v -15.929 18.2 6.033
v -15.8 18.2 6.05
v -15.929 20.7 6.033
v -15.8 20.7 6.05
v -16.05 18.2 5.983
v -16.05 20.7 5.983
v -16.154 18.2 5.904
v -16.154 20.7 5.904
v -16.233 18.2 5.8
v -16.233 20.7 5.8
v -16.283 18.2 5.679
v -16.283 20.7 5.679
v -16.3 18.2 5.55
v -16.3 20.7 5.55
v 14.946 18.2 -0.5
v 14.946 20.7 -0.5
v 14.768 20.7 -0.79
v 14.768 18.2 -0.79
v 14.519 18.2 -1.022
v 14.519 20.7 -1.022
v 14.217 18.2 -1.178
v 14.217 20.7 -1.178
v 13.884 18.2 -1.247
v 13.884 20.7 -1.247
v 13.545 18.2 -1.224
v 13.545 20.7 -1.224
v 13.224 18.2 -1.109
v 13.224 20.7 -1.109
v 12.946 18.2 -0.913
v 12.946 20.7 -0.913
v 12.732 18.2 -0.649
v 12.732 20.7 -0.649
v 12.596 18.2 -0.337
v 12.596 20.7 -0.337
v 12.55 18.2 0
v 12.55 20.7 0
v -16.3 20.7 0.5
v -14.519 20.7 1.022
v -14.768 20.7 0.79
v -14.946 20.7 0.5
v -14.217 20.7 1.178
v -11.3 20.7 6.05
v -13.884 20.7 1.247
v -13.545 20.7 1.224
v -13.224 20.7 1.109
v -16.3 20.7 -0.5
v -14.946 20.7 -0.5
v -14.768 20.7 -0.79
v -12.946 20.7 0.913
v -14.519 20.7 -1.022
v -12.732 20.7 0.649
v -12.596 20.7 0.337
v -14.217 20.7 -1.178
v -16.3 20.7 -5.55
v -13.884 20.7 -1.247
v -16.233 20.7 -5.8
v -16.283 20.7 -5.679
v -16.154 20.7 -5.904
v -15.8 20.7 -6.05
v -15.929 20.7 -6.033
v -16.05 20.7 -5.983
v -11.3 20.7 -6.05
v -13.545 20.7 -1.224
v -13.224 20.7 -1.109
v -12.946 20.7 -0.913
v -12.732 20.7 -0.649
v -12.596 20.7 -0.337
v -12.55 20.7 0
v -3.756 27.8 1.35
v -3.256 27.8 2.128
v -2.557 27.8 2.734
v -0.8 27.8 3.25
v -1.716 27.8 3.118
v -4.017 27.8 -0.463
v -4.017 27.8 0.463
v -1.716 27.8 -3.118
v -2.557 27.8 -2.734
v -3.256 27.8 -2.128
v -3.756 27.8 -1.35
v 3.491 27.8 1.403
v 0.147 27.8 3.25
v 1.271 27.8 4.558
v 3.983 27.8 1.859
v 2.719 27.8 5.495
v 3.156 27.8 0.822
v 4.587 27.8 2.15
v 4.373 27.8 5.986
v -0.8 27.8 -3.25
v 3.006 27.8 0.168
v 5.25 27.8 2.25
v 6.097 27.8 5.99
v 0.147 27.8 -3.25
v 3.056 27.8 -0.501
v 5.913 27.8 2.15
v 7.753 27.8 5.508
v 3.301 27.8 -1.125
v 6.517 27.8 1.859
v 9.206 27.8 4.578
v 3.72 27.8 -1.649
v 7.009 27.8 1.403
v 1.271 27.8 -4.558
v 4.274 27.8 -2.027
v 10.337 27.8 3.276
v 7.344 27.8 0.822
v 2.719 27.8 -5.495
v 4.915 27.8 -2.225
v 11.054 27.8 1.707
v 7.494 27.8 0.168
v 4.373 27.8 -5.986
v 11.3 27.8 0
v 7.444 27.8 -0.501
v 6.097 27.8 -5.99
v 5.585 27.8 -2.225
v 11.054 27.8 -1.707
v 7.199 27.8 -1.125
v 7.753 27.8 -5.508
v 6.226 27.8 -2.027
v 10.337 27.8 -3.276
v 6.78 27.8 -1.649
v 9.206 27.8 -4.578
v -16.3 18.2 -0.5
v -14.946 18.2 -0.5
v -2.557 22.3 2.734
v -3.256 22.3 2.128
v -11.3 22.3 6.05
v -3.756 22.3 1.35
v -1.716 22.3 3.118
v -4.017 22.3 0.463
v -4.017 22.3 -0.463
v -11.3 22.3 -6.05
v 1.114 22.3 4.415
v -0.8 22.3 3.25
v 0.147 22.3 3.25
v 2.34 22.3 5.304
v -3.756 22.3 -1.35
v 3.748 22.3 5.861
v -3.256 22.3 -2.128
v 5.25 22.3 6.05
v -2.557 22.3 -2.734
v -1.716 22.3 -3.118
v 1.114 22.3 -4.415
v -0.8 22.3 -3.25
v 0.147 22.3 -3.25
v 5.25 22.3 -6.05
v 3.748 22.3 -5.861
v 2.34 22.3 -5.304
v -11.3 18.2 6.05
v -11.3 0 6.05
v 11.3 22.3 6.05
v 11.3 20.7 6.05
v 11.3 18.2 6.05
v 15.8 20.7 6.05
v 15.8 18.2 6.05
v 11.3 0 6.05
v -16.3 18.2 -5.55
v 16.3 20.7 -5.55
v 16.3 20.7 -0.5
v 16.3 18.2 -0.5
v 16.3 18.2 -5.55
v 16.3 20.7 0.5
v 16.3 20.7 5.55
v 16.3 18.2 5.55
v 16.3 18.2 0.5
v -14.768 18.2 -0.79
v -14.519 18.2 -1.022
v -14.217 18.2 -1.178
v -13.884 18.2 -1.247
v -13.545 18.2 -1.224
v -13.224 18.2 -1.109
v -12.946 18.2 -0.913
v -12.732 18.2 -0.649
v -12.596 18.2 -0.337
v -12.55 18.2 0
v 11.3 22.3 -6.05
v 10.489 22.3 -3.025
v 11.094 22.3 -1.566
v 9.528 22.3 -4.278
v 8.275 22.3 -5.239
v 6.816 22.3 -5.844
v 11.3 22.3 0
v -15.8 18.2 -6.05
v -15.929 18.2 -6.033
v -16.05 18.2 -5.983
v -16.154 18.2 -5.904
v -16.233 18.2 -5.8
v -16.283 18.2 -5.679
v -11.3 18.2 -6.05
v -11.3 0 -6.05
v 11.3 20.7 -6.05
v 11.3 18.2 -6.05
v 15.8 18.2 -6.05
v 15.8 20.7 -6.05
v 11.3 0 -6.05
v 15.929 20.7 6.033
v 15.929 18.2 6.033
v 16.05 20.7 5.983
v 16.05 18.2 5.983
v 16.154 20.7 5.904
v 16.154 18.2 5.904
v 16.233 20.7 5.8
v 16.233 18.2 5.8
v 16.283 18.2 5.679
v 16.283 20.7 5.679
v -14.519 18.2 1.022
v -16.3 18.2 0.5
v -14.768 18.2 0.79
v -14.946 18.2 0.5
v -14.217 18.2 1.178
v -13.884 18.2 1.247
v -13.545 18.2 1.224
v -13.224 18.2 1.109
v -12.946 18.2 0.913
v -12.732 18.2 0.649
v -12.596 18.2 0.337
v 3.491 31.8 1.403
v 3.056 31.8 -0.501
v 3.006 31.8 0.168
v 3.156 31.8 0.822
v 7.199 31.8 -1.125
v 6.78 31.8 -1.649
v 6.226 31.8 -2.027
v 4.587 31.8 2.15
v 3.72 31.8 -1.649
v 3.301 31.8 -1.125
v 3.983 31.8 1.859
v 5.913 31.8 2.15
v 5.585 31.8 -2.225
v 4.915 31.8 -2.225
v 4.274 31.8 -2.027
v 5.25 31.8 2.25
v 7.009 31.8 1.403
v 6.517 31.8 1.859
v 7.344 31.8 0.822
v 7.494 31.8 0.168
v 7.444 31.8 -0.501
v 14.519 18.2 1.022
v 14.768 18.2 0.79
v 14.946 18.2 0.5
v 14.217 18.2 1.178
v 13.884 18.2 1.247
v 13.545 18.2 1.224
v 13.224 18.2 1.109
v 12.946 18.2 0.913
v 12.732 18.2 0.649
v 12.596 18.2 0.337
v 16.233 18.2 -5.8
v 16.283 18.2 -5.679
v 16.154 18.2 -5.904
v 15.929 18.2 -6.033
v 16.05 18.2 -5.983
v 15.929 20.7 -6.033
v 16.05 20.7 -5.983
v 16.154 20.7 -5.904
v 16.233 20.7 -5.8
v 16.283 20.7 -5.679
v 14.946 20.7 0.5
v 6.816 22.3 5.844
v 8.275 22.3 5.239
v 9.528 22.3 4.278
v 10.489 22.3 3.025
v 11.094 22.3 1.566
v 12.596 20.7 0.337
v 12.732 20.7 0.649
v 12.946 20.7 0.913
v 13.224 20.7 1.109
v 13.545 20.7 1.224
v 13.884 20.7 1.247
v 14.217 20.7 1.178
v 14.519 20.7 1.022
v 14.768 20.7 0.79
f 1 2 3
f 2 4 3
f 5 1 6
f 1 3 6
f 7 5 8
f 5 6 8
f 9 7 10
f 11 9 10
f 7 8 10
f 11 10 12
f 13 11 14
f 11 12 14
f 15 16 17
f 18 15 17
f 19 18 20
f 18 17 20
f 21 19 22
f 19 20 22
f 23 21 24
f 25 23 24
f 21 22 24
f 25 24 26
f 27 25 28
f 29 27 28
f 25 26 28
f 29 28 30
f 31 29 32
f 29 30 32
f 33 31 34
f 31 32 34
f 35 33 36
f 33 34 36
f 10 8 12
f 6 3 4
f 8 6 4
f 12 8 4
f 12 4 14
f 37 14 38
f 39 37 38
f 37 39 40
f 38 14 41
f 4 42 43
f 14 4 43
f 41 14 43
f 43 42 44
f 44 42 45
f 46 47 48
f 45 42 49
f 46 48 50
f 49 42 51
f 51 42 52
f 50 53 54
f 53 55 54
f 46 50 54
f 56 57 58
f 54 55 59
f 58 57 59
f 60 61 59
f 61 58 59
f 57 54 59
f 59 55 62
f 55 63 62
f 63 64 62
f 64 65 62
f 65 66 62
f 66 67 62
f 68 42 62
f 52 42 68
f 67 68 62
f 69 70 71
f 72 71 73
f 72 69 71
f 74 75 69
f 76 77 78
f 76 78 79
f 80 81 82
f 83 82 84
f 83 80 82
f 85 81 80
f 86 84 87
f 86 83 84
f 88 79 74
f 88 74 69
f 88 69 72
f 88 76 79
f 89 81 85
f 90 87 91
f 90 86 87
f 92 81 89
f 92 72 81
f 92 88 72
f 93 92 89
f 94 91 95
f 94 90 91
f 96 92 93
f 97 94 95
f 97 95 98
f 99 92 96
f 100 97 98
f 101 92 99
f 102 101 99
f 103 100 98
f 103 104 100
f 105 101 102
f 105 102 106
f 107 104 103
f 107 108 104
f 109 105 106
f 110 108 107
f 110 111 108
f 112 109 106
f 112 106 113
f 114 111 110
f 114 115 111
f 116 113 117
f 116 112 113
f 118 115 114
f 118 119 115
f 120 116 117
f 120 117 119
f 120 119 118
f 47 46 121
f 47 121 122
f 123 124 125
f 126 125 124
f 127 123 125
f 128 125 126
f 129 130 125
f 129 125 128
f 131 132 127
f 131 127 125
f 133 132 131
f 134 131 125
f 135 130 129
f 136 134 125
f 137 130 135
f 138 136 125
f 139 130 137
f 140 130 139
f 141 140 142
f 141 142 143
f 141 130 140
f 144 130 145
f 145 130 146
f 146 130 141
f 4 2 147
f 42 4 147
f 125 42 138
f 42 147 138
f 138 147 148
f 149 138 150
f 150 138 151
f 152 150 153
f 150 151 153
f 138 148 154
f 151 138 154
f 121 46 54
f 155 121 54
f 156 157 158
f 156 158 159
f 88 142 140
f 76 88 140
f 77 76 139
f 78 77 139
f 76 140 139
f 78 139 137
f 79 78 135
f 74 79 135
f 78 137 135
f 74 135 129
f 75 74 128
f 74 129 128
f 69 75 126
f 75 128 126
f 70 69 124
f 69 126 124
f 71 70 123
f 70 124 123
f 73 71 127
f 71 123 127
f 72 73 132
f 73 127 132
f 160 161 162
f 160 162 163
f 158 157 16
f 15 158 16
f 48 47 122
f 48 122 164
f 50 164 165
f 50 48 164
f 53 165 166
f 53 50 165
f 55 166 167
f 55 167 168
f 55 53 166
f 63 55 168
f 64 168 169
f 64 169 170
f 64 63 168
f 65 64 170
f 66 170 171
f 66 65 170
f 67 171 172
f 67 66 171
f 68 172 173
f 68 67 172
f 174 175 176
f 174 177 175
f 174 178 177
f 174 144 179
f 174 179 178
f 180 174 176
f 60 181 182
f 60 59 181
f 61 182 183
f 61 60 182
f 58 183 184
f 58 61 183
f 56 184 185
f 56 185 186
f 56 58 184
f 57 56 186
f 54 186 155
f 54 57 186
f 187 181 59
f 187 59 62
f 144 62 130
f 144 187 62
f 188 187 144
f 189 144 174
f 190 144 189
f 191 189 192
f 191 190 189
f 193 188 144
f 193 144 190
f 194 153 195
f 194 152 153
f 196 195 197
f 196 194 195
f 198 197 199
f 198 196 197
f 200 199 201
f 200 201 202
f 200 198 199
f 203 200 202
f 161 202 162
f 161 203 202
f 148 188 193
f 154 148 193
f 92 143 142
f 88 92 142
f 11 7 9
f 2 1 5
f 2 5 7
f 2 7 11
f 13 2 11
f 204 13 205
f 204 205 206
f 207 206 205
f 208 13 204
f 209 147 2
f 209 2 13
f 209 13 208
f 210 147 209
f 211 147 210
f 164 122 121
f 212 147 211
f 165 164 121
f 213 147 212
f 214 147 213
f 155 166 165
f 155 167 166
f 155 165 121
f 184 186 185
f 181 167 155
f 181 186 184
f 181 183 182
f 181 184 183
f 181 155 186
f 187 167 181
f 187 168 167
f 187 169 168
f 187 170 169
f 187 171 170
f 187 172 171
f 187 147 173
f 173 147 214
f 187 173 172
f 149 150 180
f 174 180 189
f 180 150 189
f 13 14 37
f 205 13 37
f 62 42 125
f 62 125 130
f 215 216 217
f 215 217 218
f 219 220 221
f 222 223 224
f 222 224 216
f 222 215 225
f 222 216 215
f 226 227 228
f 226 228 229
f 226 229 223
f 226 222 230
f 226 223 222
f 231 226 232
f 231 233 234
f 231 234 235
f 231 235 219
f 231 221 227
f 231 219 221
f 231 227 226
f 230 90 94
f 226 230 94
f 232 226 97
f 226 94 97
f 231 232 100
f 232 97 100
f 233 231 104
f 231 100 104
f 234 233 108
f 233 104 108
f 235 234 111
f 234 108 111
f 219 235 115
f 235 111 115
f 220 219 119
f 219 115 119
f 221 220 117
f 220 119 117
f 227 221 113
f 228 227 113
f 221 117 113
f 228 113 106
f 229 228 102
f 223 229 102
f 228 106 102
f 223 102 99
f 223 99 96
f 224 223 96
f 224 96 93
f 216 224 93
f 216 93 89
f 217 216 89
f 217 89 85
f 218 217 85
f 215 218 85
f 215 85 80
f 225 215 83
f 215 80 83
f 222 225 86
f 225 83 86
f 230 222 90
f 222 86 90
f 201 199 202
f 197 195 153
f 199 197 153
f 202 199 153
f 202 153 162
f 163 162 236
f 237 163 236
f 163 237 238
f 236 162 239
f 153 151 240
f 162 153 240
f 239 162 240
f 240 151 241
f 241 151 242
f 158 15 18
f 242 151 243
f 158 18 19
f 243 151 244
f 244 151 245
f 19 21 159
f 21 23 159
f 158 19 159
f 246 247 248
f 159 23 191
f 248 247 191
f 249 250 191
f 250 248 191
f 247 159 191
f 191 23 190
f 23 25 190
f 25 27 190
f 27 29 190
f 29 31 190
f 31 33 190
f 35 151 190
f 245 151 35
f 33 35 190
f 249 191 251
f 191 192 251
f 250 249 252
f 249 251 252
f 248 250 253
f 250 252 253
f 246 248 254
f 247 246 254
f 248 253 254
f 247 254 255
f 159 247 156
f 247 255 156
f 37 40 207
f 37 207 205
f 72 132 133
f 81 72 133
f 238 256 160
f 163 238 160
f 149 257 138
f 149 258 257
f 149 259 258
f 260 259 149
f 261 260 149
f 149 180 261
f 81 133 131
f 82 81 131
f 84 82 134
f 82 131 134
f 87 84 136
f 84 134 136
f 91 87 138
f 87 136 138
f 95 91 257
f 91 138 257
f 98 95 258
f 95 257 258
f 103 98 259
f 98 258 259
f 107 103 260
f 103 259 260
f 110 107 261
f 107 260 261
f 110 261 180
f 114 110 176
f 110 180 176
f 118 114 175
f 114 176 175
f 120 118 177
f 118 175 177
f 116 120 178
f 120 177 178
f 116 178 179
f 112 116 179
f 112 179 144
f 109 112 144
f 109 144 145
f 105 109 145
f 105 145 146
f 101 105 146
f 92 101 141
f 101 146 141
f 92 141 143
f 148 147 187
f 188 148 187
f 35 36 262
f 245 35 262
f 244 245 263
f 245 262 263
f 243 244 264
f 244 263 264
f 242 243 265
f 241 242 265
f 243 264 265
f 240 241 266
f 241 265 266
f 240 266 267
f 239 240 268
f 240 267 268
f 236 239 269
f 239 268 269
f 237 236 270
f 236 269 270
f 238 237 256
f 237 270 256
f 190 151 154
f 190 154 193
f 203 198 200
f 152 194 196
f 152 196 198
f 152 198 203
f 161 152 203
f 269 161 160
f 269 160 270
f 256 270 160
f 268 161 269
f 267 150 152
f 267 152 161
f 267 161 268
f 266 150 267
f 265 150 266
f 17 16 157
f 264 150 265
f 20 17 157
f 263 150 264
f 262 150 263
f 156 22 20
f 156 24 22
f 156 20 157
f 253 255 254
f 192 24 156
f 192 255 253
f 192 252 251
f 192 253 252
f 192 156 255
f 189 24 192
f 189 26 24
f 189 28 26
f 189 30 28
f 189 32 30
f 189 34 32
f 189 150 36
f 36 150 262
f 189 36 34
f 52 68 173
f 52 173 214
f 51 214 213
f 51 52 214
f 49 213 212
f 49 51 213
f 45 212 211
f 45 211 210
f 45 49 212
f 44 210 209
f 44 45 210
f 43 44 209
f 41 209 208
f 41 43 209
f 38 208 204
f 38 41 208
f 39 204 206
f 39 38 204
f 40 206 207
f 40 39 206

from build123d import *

# Parameters (mm, degrees)
SKETCH1_W           = 22.6
SKETCH1_H           = 12.1
BOSS_EXTRUDE1_DEPTH = 22.3
SKETCH2_W           = 12.1
SKETCH2_H           = 2.5
BOSS_EXTRUDE2_DEPTH = 5
BOSS_EXTRUDE3_DEPTH = 5.5
SKETCH4_R           = 2.25
BOSS_EXTRUDE4_DEPTH = 4
CUT_EXTRUDE1_REACH  = 29.033
FILLET1_R           = 0.5


with BuildPart() as part:
    # Sketch1 → Boss-Extrude1 (new body)
    with BuildSketch(Plane(origin=(0, 0, 0), x_dir=(1, 0, 0), z_dir=(0, 1, 0))):
        Rectangle(SKETCH1_W, SKETCH1_H)
    extrude(amount=BOSS_EXTRUDE1_DEPTH)

    # Sketch2 → Boss-Extrude2 (add)
    with BuildSketch(Plane(origin=(11.3, 0, 0), x_dir=(0, 0, -1), z_dir=(1, 0, 0))):
        with Locations((0, 19.45)):
            Rectangle(SKETCH2_W, SKETCH2_H)
    boss_extrude2 = extrude(amount=BOSS_EXTRUDE2_DEPTH)

    # Mirror1: Boss-Extrude2 across plane
    add(boss_extrude2.mirror(Plane(origin=(0, 0, 0), x_dir=(0, 0, 1), z_dir=(1, 0, 0))))

    # Sketch3 → Boss-Extrude3 (add)
    with BuildSketch(Plane(origin=(0, 22.3, 0), x_dir=(1, 0, 0), z_dir=(0, 1, 0))):
        with BuildLine():
            ThreePointArc((-0.8, 3.25), (-4.05, 0), (-0.8, -3.25))
            Line((-0.8, -3.25), (0.147059671, -3.25))
            ThreePointArc((0.147059671, -3.25), (11.3, 0), (0.147059671, 3.25))
            Line((0.147059671, 3.25), (-0.8, 3.25))
        make_face()
    extrude(amount=BOSS_EXTRUDE3_DEPTH)

    # Sketch4 → Boss-Extrude4 (add)
    with BuildSketch(Plane(origin=(0, 27.8, 0), x_dir=(1, 0, 0), z_dir=(0, 1, 0))):
        with Locations(Location((5.25, 0, 0), (0, 0, 270))):
            Circle(SKETCH4_R)
    extrude(amount=BOSS_EXTRUDE4_DEPTH)

    # Sketch6 → Cut-Extrude1 (cut, up to next)
    with BuildSketch(Plane(origin=(0, 20.7, 0), x_dir=(1, 0, 0), z_dir=(0, 1, 0)), mode=Mode.PRIVATE) as cut_extrude1_sk1:
        with BuildLine():
            Line((16.3, -0.5), (16.3, 0))
            Line((16.3, 0), (15.05, 0))
            ThreePointArc((15.05, 0), (15.023632891, -0.255387055), (14.945643924, -0.5))
            Line((14.945643924, -0.5), (16.3, -0.5))
        make_face()
    cut_extrude1_tool1 = extrude(cut_extrude1_sk1.sketch, amount=-CUT_EXTRUDE1_REACH, mode=Mode.PRIVATE) & part.part
    # Sketch6 → Cut-Extrude1 (cut, up to next)
    with BuildSketch(Plane(origin=(0, 20.7, 0), x_dir=(1, 0, 0), z_dir=(0, 1, 0)), mode=Mode.PRIVATE) as cut_extrude1_sk2:
        with BuildLine():
            Line((15.05, 0), (16.3, 0))
            Line((16.3, 0), (16.3, 0.5))
            Line((16.3, 0.5), (14.945643924, 0.5))
            ThreePointArc((14.945643924, 0.5), (15.023632891, 0.255387055), (15.05, 0))
        make_face()
    cut_extrude1_tool2 = extrude(cut_extrude1_sk2.sketch, amount=-CUT_EXTRUDE1_REACH, mode=Mode.PRIVATE) & part.part
    # Sketch6 → Cut-Extrude1 (cut, up to next)
    with BuildSketch(Plane(origin=(0, 20.7, 0), x_dir=(1, 0, 0), z_dir=(0, 1, 0)), mode=Mode.PRIVATE) as cut_extrude1_sk3:
        with BuildLine():
            ThreePointArc((14.945643924, -0.5), (15.023632891, -0.255387055), (15.05, 0))
            Line((15.05, 0), (12.55, 0))
            ThreePointArc((12.55, 0), (13.544612945, -1.223632891), (14.945643924, -0.5))
        make_face()
    cut_extrude1_tool3 = extrude(cut_extrude1_sk3.sketch, amount=-CUT_EXTRUDE1_REACH, mode=Mode.PRIVATE) & part.part
    # Sketch6 → Cut-Extrude1 (cut, up to next)
    with BuildSketch(Plane(origin=(0, 20.7, 0), x_dir=(1, 0, 0), z_dir=(0, 1, 0)), mode=Mode.PRIVATE) as cut_extrude1_sk4:
        with BuildLine():
            Line((12.55, 0), (15.05, 0))
            ThreePointArc((15.05, 0), (15.023632891, 0.255387055), (14.945643924, 0.5))
            ThreePointArc((14.945643924, 0.5), (13.544612945, 1.223632891), (12.55, 0))
        make_face()
    cut_extrude1_tool4 = extrude(cut_extrude1_sk4.sketch, amount=-CUT_EXTRUDE1_REACH, mode=Mode.PRIVATE) & part.part
    # Sketch6 → Cut-Extrude1 (cut, up to next)
    with BuildSketch(Plane(origin=(0, 20.7, 0), x_dir=(1, 0, 0), z_dir=(0, 1, 0)), mode=Mode.PRIVATE) as cut_extrude1_sk5:
        with BuildLine():
            ThreePointArc((14.945643924, -0.5), (15.023632891, -0.255387055), (15.05, 0))
            Line((15.05, 0), (12.55, 0))
            ThreePointArc((12.55, 0), (13.544612945, -1.223632891), (14.945643924, -0.5))
        make_face()
    cut_extrude1_tool5 = extrude(cut_extrude1_sk5.sketch, amount=-CUT_EXTRUDE1_REACH, mode=Mode.PRIVATE) & part.part
    # Sketch6 → Cut-Extrude1 (cut, up to next)
    with BuildSketch(Plane(origin=(0, 20.7, 0), x_dir=(1, 0, 0), z_dir=(0, 1, 0)), mode=Mode.PRIVATE) as cut_extrude1_sk6:
        with BuildLine():
            Line((12.55, 0), (15.05, 0))
            ThreePointArc((15.05, 0), (15.023632891, 0.255387055), (14.945643924, 0.5))
            ThreePointArc((14.945643924, 0.5), (13.544612945, 1.223632891), (12.55, 0))
        make_face()
    cut_extrude1_tool6 = extrude(cut_extrude1_sk6.sketch, amount=-CUT_EXTRUDE1_REACH, mode=Mode.PRIVATE) & part.part
    cut_extrude1_1 = cut_extrude1_tool1.solids().sort_by_distance((15.657536, 20.7, 0.253356))[0]
    add(cut_extrude1_1, mode=Mode.SUBTRACT)
    cut_extrude1_2 = cut_extrude1_tool2.solids().sort_by_distance((15.657536, 20.7, -0.253356))[0]
    add(cut_extrude1_2, mode=Mode.SUBTRACT)
    cut_extrude1_3 = cut_extrude1_tool3.solids().sort_by_distance((13.8, 20.7, 0.530516))[0]
    add(cut_extrude1_3, mode=Mode.SUBTRACT)
    cut_extrude1_4 = cut_extrude1_tool4.solids().sort_by_distance((13.8, 20.7, -0.530516))[0]
    add(cut_extrude1_4, mode=Mode.SUBTRACT)
    cut_extrude1_5 = cut_extrude1_tool5.solids().sort_by_distance((13.8, 20.7, 0.530516))[0]
    add(cut_extrude1_5, mode=Mode.SUBTRACT)
    cut_extrude1_6 = cut_extrude1_tool6.solids().sort_by_distance((13.8, 20.7, -0.530516))[0]
    add(cut_extrude1_6, mode=Mode.SUBTRACT)
    cut_extrude1 = cut_extrude1_1 + cut_extrude1_2 + cut_extrude1_3 + cut_extrude1_4 + cut_extrude1_5 + cut_extrude1_6  # Cut-Extrude1 as one shape, for the pattern or mirror that repeats it

    # Mirror2: Cut-Extrude1 across plane
    add(cut_extrude1.mirror(Plane(origin=(0, 0, 0), x_dir=(0, 0, 1), z_dir=(1, 0, 0))), mode=Mode.SUBTRACT)

    # Fillet1
    fillet1_edges = [part.edges().sort_by_distance(p)[0] for p in [
        (16.3, 19.45, -6.05),
        (16.3, 19.45, 6.05),
        (-16.3, 19.45, -6.05),
        (-16.3, 19.45, 6.05),
    ]]
    fillet(fillet1_edges, radius=FILLET1_R)


solid = part.part
